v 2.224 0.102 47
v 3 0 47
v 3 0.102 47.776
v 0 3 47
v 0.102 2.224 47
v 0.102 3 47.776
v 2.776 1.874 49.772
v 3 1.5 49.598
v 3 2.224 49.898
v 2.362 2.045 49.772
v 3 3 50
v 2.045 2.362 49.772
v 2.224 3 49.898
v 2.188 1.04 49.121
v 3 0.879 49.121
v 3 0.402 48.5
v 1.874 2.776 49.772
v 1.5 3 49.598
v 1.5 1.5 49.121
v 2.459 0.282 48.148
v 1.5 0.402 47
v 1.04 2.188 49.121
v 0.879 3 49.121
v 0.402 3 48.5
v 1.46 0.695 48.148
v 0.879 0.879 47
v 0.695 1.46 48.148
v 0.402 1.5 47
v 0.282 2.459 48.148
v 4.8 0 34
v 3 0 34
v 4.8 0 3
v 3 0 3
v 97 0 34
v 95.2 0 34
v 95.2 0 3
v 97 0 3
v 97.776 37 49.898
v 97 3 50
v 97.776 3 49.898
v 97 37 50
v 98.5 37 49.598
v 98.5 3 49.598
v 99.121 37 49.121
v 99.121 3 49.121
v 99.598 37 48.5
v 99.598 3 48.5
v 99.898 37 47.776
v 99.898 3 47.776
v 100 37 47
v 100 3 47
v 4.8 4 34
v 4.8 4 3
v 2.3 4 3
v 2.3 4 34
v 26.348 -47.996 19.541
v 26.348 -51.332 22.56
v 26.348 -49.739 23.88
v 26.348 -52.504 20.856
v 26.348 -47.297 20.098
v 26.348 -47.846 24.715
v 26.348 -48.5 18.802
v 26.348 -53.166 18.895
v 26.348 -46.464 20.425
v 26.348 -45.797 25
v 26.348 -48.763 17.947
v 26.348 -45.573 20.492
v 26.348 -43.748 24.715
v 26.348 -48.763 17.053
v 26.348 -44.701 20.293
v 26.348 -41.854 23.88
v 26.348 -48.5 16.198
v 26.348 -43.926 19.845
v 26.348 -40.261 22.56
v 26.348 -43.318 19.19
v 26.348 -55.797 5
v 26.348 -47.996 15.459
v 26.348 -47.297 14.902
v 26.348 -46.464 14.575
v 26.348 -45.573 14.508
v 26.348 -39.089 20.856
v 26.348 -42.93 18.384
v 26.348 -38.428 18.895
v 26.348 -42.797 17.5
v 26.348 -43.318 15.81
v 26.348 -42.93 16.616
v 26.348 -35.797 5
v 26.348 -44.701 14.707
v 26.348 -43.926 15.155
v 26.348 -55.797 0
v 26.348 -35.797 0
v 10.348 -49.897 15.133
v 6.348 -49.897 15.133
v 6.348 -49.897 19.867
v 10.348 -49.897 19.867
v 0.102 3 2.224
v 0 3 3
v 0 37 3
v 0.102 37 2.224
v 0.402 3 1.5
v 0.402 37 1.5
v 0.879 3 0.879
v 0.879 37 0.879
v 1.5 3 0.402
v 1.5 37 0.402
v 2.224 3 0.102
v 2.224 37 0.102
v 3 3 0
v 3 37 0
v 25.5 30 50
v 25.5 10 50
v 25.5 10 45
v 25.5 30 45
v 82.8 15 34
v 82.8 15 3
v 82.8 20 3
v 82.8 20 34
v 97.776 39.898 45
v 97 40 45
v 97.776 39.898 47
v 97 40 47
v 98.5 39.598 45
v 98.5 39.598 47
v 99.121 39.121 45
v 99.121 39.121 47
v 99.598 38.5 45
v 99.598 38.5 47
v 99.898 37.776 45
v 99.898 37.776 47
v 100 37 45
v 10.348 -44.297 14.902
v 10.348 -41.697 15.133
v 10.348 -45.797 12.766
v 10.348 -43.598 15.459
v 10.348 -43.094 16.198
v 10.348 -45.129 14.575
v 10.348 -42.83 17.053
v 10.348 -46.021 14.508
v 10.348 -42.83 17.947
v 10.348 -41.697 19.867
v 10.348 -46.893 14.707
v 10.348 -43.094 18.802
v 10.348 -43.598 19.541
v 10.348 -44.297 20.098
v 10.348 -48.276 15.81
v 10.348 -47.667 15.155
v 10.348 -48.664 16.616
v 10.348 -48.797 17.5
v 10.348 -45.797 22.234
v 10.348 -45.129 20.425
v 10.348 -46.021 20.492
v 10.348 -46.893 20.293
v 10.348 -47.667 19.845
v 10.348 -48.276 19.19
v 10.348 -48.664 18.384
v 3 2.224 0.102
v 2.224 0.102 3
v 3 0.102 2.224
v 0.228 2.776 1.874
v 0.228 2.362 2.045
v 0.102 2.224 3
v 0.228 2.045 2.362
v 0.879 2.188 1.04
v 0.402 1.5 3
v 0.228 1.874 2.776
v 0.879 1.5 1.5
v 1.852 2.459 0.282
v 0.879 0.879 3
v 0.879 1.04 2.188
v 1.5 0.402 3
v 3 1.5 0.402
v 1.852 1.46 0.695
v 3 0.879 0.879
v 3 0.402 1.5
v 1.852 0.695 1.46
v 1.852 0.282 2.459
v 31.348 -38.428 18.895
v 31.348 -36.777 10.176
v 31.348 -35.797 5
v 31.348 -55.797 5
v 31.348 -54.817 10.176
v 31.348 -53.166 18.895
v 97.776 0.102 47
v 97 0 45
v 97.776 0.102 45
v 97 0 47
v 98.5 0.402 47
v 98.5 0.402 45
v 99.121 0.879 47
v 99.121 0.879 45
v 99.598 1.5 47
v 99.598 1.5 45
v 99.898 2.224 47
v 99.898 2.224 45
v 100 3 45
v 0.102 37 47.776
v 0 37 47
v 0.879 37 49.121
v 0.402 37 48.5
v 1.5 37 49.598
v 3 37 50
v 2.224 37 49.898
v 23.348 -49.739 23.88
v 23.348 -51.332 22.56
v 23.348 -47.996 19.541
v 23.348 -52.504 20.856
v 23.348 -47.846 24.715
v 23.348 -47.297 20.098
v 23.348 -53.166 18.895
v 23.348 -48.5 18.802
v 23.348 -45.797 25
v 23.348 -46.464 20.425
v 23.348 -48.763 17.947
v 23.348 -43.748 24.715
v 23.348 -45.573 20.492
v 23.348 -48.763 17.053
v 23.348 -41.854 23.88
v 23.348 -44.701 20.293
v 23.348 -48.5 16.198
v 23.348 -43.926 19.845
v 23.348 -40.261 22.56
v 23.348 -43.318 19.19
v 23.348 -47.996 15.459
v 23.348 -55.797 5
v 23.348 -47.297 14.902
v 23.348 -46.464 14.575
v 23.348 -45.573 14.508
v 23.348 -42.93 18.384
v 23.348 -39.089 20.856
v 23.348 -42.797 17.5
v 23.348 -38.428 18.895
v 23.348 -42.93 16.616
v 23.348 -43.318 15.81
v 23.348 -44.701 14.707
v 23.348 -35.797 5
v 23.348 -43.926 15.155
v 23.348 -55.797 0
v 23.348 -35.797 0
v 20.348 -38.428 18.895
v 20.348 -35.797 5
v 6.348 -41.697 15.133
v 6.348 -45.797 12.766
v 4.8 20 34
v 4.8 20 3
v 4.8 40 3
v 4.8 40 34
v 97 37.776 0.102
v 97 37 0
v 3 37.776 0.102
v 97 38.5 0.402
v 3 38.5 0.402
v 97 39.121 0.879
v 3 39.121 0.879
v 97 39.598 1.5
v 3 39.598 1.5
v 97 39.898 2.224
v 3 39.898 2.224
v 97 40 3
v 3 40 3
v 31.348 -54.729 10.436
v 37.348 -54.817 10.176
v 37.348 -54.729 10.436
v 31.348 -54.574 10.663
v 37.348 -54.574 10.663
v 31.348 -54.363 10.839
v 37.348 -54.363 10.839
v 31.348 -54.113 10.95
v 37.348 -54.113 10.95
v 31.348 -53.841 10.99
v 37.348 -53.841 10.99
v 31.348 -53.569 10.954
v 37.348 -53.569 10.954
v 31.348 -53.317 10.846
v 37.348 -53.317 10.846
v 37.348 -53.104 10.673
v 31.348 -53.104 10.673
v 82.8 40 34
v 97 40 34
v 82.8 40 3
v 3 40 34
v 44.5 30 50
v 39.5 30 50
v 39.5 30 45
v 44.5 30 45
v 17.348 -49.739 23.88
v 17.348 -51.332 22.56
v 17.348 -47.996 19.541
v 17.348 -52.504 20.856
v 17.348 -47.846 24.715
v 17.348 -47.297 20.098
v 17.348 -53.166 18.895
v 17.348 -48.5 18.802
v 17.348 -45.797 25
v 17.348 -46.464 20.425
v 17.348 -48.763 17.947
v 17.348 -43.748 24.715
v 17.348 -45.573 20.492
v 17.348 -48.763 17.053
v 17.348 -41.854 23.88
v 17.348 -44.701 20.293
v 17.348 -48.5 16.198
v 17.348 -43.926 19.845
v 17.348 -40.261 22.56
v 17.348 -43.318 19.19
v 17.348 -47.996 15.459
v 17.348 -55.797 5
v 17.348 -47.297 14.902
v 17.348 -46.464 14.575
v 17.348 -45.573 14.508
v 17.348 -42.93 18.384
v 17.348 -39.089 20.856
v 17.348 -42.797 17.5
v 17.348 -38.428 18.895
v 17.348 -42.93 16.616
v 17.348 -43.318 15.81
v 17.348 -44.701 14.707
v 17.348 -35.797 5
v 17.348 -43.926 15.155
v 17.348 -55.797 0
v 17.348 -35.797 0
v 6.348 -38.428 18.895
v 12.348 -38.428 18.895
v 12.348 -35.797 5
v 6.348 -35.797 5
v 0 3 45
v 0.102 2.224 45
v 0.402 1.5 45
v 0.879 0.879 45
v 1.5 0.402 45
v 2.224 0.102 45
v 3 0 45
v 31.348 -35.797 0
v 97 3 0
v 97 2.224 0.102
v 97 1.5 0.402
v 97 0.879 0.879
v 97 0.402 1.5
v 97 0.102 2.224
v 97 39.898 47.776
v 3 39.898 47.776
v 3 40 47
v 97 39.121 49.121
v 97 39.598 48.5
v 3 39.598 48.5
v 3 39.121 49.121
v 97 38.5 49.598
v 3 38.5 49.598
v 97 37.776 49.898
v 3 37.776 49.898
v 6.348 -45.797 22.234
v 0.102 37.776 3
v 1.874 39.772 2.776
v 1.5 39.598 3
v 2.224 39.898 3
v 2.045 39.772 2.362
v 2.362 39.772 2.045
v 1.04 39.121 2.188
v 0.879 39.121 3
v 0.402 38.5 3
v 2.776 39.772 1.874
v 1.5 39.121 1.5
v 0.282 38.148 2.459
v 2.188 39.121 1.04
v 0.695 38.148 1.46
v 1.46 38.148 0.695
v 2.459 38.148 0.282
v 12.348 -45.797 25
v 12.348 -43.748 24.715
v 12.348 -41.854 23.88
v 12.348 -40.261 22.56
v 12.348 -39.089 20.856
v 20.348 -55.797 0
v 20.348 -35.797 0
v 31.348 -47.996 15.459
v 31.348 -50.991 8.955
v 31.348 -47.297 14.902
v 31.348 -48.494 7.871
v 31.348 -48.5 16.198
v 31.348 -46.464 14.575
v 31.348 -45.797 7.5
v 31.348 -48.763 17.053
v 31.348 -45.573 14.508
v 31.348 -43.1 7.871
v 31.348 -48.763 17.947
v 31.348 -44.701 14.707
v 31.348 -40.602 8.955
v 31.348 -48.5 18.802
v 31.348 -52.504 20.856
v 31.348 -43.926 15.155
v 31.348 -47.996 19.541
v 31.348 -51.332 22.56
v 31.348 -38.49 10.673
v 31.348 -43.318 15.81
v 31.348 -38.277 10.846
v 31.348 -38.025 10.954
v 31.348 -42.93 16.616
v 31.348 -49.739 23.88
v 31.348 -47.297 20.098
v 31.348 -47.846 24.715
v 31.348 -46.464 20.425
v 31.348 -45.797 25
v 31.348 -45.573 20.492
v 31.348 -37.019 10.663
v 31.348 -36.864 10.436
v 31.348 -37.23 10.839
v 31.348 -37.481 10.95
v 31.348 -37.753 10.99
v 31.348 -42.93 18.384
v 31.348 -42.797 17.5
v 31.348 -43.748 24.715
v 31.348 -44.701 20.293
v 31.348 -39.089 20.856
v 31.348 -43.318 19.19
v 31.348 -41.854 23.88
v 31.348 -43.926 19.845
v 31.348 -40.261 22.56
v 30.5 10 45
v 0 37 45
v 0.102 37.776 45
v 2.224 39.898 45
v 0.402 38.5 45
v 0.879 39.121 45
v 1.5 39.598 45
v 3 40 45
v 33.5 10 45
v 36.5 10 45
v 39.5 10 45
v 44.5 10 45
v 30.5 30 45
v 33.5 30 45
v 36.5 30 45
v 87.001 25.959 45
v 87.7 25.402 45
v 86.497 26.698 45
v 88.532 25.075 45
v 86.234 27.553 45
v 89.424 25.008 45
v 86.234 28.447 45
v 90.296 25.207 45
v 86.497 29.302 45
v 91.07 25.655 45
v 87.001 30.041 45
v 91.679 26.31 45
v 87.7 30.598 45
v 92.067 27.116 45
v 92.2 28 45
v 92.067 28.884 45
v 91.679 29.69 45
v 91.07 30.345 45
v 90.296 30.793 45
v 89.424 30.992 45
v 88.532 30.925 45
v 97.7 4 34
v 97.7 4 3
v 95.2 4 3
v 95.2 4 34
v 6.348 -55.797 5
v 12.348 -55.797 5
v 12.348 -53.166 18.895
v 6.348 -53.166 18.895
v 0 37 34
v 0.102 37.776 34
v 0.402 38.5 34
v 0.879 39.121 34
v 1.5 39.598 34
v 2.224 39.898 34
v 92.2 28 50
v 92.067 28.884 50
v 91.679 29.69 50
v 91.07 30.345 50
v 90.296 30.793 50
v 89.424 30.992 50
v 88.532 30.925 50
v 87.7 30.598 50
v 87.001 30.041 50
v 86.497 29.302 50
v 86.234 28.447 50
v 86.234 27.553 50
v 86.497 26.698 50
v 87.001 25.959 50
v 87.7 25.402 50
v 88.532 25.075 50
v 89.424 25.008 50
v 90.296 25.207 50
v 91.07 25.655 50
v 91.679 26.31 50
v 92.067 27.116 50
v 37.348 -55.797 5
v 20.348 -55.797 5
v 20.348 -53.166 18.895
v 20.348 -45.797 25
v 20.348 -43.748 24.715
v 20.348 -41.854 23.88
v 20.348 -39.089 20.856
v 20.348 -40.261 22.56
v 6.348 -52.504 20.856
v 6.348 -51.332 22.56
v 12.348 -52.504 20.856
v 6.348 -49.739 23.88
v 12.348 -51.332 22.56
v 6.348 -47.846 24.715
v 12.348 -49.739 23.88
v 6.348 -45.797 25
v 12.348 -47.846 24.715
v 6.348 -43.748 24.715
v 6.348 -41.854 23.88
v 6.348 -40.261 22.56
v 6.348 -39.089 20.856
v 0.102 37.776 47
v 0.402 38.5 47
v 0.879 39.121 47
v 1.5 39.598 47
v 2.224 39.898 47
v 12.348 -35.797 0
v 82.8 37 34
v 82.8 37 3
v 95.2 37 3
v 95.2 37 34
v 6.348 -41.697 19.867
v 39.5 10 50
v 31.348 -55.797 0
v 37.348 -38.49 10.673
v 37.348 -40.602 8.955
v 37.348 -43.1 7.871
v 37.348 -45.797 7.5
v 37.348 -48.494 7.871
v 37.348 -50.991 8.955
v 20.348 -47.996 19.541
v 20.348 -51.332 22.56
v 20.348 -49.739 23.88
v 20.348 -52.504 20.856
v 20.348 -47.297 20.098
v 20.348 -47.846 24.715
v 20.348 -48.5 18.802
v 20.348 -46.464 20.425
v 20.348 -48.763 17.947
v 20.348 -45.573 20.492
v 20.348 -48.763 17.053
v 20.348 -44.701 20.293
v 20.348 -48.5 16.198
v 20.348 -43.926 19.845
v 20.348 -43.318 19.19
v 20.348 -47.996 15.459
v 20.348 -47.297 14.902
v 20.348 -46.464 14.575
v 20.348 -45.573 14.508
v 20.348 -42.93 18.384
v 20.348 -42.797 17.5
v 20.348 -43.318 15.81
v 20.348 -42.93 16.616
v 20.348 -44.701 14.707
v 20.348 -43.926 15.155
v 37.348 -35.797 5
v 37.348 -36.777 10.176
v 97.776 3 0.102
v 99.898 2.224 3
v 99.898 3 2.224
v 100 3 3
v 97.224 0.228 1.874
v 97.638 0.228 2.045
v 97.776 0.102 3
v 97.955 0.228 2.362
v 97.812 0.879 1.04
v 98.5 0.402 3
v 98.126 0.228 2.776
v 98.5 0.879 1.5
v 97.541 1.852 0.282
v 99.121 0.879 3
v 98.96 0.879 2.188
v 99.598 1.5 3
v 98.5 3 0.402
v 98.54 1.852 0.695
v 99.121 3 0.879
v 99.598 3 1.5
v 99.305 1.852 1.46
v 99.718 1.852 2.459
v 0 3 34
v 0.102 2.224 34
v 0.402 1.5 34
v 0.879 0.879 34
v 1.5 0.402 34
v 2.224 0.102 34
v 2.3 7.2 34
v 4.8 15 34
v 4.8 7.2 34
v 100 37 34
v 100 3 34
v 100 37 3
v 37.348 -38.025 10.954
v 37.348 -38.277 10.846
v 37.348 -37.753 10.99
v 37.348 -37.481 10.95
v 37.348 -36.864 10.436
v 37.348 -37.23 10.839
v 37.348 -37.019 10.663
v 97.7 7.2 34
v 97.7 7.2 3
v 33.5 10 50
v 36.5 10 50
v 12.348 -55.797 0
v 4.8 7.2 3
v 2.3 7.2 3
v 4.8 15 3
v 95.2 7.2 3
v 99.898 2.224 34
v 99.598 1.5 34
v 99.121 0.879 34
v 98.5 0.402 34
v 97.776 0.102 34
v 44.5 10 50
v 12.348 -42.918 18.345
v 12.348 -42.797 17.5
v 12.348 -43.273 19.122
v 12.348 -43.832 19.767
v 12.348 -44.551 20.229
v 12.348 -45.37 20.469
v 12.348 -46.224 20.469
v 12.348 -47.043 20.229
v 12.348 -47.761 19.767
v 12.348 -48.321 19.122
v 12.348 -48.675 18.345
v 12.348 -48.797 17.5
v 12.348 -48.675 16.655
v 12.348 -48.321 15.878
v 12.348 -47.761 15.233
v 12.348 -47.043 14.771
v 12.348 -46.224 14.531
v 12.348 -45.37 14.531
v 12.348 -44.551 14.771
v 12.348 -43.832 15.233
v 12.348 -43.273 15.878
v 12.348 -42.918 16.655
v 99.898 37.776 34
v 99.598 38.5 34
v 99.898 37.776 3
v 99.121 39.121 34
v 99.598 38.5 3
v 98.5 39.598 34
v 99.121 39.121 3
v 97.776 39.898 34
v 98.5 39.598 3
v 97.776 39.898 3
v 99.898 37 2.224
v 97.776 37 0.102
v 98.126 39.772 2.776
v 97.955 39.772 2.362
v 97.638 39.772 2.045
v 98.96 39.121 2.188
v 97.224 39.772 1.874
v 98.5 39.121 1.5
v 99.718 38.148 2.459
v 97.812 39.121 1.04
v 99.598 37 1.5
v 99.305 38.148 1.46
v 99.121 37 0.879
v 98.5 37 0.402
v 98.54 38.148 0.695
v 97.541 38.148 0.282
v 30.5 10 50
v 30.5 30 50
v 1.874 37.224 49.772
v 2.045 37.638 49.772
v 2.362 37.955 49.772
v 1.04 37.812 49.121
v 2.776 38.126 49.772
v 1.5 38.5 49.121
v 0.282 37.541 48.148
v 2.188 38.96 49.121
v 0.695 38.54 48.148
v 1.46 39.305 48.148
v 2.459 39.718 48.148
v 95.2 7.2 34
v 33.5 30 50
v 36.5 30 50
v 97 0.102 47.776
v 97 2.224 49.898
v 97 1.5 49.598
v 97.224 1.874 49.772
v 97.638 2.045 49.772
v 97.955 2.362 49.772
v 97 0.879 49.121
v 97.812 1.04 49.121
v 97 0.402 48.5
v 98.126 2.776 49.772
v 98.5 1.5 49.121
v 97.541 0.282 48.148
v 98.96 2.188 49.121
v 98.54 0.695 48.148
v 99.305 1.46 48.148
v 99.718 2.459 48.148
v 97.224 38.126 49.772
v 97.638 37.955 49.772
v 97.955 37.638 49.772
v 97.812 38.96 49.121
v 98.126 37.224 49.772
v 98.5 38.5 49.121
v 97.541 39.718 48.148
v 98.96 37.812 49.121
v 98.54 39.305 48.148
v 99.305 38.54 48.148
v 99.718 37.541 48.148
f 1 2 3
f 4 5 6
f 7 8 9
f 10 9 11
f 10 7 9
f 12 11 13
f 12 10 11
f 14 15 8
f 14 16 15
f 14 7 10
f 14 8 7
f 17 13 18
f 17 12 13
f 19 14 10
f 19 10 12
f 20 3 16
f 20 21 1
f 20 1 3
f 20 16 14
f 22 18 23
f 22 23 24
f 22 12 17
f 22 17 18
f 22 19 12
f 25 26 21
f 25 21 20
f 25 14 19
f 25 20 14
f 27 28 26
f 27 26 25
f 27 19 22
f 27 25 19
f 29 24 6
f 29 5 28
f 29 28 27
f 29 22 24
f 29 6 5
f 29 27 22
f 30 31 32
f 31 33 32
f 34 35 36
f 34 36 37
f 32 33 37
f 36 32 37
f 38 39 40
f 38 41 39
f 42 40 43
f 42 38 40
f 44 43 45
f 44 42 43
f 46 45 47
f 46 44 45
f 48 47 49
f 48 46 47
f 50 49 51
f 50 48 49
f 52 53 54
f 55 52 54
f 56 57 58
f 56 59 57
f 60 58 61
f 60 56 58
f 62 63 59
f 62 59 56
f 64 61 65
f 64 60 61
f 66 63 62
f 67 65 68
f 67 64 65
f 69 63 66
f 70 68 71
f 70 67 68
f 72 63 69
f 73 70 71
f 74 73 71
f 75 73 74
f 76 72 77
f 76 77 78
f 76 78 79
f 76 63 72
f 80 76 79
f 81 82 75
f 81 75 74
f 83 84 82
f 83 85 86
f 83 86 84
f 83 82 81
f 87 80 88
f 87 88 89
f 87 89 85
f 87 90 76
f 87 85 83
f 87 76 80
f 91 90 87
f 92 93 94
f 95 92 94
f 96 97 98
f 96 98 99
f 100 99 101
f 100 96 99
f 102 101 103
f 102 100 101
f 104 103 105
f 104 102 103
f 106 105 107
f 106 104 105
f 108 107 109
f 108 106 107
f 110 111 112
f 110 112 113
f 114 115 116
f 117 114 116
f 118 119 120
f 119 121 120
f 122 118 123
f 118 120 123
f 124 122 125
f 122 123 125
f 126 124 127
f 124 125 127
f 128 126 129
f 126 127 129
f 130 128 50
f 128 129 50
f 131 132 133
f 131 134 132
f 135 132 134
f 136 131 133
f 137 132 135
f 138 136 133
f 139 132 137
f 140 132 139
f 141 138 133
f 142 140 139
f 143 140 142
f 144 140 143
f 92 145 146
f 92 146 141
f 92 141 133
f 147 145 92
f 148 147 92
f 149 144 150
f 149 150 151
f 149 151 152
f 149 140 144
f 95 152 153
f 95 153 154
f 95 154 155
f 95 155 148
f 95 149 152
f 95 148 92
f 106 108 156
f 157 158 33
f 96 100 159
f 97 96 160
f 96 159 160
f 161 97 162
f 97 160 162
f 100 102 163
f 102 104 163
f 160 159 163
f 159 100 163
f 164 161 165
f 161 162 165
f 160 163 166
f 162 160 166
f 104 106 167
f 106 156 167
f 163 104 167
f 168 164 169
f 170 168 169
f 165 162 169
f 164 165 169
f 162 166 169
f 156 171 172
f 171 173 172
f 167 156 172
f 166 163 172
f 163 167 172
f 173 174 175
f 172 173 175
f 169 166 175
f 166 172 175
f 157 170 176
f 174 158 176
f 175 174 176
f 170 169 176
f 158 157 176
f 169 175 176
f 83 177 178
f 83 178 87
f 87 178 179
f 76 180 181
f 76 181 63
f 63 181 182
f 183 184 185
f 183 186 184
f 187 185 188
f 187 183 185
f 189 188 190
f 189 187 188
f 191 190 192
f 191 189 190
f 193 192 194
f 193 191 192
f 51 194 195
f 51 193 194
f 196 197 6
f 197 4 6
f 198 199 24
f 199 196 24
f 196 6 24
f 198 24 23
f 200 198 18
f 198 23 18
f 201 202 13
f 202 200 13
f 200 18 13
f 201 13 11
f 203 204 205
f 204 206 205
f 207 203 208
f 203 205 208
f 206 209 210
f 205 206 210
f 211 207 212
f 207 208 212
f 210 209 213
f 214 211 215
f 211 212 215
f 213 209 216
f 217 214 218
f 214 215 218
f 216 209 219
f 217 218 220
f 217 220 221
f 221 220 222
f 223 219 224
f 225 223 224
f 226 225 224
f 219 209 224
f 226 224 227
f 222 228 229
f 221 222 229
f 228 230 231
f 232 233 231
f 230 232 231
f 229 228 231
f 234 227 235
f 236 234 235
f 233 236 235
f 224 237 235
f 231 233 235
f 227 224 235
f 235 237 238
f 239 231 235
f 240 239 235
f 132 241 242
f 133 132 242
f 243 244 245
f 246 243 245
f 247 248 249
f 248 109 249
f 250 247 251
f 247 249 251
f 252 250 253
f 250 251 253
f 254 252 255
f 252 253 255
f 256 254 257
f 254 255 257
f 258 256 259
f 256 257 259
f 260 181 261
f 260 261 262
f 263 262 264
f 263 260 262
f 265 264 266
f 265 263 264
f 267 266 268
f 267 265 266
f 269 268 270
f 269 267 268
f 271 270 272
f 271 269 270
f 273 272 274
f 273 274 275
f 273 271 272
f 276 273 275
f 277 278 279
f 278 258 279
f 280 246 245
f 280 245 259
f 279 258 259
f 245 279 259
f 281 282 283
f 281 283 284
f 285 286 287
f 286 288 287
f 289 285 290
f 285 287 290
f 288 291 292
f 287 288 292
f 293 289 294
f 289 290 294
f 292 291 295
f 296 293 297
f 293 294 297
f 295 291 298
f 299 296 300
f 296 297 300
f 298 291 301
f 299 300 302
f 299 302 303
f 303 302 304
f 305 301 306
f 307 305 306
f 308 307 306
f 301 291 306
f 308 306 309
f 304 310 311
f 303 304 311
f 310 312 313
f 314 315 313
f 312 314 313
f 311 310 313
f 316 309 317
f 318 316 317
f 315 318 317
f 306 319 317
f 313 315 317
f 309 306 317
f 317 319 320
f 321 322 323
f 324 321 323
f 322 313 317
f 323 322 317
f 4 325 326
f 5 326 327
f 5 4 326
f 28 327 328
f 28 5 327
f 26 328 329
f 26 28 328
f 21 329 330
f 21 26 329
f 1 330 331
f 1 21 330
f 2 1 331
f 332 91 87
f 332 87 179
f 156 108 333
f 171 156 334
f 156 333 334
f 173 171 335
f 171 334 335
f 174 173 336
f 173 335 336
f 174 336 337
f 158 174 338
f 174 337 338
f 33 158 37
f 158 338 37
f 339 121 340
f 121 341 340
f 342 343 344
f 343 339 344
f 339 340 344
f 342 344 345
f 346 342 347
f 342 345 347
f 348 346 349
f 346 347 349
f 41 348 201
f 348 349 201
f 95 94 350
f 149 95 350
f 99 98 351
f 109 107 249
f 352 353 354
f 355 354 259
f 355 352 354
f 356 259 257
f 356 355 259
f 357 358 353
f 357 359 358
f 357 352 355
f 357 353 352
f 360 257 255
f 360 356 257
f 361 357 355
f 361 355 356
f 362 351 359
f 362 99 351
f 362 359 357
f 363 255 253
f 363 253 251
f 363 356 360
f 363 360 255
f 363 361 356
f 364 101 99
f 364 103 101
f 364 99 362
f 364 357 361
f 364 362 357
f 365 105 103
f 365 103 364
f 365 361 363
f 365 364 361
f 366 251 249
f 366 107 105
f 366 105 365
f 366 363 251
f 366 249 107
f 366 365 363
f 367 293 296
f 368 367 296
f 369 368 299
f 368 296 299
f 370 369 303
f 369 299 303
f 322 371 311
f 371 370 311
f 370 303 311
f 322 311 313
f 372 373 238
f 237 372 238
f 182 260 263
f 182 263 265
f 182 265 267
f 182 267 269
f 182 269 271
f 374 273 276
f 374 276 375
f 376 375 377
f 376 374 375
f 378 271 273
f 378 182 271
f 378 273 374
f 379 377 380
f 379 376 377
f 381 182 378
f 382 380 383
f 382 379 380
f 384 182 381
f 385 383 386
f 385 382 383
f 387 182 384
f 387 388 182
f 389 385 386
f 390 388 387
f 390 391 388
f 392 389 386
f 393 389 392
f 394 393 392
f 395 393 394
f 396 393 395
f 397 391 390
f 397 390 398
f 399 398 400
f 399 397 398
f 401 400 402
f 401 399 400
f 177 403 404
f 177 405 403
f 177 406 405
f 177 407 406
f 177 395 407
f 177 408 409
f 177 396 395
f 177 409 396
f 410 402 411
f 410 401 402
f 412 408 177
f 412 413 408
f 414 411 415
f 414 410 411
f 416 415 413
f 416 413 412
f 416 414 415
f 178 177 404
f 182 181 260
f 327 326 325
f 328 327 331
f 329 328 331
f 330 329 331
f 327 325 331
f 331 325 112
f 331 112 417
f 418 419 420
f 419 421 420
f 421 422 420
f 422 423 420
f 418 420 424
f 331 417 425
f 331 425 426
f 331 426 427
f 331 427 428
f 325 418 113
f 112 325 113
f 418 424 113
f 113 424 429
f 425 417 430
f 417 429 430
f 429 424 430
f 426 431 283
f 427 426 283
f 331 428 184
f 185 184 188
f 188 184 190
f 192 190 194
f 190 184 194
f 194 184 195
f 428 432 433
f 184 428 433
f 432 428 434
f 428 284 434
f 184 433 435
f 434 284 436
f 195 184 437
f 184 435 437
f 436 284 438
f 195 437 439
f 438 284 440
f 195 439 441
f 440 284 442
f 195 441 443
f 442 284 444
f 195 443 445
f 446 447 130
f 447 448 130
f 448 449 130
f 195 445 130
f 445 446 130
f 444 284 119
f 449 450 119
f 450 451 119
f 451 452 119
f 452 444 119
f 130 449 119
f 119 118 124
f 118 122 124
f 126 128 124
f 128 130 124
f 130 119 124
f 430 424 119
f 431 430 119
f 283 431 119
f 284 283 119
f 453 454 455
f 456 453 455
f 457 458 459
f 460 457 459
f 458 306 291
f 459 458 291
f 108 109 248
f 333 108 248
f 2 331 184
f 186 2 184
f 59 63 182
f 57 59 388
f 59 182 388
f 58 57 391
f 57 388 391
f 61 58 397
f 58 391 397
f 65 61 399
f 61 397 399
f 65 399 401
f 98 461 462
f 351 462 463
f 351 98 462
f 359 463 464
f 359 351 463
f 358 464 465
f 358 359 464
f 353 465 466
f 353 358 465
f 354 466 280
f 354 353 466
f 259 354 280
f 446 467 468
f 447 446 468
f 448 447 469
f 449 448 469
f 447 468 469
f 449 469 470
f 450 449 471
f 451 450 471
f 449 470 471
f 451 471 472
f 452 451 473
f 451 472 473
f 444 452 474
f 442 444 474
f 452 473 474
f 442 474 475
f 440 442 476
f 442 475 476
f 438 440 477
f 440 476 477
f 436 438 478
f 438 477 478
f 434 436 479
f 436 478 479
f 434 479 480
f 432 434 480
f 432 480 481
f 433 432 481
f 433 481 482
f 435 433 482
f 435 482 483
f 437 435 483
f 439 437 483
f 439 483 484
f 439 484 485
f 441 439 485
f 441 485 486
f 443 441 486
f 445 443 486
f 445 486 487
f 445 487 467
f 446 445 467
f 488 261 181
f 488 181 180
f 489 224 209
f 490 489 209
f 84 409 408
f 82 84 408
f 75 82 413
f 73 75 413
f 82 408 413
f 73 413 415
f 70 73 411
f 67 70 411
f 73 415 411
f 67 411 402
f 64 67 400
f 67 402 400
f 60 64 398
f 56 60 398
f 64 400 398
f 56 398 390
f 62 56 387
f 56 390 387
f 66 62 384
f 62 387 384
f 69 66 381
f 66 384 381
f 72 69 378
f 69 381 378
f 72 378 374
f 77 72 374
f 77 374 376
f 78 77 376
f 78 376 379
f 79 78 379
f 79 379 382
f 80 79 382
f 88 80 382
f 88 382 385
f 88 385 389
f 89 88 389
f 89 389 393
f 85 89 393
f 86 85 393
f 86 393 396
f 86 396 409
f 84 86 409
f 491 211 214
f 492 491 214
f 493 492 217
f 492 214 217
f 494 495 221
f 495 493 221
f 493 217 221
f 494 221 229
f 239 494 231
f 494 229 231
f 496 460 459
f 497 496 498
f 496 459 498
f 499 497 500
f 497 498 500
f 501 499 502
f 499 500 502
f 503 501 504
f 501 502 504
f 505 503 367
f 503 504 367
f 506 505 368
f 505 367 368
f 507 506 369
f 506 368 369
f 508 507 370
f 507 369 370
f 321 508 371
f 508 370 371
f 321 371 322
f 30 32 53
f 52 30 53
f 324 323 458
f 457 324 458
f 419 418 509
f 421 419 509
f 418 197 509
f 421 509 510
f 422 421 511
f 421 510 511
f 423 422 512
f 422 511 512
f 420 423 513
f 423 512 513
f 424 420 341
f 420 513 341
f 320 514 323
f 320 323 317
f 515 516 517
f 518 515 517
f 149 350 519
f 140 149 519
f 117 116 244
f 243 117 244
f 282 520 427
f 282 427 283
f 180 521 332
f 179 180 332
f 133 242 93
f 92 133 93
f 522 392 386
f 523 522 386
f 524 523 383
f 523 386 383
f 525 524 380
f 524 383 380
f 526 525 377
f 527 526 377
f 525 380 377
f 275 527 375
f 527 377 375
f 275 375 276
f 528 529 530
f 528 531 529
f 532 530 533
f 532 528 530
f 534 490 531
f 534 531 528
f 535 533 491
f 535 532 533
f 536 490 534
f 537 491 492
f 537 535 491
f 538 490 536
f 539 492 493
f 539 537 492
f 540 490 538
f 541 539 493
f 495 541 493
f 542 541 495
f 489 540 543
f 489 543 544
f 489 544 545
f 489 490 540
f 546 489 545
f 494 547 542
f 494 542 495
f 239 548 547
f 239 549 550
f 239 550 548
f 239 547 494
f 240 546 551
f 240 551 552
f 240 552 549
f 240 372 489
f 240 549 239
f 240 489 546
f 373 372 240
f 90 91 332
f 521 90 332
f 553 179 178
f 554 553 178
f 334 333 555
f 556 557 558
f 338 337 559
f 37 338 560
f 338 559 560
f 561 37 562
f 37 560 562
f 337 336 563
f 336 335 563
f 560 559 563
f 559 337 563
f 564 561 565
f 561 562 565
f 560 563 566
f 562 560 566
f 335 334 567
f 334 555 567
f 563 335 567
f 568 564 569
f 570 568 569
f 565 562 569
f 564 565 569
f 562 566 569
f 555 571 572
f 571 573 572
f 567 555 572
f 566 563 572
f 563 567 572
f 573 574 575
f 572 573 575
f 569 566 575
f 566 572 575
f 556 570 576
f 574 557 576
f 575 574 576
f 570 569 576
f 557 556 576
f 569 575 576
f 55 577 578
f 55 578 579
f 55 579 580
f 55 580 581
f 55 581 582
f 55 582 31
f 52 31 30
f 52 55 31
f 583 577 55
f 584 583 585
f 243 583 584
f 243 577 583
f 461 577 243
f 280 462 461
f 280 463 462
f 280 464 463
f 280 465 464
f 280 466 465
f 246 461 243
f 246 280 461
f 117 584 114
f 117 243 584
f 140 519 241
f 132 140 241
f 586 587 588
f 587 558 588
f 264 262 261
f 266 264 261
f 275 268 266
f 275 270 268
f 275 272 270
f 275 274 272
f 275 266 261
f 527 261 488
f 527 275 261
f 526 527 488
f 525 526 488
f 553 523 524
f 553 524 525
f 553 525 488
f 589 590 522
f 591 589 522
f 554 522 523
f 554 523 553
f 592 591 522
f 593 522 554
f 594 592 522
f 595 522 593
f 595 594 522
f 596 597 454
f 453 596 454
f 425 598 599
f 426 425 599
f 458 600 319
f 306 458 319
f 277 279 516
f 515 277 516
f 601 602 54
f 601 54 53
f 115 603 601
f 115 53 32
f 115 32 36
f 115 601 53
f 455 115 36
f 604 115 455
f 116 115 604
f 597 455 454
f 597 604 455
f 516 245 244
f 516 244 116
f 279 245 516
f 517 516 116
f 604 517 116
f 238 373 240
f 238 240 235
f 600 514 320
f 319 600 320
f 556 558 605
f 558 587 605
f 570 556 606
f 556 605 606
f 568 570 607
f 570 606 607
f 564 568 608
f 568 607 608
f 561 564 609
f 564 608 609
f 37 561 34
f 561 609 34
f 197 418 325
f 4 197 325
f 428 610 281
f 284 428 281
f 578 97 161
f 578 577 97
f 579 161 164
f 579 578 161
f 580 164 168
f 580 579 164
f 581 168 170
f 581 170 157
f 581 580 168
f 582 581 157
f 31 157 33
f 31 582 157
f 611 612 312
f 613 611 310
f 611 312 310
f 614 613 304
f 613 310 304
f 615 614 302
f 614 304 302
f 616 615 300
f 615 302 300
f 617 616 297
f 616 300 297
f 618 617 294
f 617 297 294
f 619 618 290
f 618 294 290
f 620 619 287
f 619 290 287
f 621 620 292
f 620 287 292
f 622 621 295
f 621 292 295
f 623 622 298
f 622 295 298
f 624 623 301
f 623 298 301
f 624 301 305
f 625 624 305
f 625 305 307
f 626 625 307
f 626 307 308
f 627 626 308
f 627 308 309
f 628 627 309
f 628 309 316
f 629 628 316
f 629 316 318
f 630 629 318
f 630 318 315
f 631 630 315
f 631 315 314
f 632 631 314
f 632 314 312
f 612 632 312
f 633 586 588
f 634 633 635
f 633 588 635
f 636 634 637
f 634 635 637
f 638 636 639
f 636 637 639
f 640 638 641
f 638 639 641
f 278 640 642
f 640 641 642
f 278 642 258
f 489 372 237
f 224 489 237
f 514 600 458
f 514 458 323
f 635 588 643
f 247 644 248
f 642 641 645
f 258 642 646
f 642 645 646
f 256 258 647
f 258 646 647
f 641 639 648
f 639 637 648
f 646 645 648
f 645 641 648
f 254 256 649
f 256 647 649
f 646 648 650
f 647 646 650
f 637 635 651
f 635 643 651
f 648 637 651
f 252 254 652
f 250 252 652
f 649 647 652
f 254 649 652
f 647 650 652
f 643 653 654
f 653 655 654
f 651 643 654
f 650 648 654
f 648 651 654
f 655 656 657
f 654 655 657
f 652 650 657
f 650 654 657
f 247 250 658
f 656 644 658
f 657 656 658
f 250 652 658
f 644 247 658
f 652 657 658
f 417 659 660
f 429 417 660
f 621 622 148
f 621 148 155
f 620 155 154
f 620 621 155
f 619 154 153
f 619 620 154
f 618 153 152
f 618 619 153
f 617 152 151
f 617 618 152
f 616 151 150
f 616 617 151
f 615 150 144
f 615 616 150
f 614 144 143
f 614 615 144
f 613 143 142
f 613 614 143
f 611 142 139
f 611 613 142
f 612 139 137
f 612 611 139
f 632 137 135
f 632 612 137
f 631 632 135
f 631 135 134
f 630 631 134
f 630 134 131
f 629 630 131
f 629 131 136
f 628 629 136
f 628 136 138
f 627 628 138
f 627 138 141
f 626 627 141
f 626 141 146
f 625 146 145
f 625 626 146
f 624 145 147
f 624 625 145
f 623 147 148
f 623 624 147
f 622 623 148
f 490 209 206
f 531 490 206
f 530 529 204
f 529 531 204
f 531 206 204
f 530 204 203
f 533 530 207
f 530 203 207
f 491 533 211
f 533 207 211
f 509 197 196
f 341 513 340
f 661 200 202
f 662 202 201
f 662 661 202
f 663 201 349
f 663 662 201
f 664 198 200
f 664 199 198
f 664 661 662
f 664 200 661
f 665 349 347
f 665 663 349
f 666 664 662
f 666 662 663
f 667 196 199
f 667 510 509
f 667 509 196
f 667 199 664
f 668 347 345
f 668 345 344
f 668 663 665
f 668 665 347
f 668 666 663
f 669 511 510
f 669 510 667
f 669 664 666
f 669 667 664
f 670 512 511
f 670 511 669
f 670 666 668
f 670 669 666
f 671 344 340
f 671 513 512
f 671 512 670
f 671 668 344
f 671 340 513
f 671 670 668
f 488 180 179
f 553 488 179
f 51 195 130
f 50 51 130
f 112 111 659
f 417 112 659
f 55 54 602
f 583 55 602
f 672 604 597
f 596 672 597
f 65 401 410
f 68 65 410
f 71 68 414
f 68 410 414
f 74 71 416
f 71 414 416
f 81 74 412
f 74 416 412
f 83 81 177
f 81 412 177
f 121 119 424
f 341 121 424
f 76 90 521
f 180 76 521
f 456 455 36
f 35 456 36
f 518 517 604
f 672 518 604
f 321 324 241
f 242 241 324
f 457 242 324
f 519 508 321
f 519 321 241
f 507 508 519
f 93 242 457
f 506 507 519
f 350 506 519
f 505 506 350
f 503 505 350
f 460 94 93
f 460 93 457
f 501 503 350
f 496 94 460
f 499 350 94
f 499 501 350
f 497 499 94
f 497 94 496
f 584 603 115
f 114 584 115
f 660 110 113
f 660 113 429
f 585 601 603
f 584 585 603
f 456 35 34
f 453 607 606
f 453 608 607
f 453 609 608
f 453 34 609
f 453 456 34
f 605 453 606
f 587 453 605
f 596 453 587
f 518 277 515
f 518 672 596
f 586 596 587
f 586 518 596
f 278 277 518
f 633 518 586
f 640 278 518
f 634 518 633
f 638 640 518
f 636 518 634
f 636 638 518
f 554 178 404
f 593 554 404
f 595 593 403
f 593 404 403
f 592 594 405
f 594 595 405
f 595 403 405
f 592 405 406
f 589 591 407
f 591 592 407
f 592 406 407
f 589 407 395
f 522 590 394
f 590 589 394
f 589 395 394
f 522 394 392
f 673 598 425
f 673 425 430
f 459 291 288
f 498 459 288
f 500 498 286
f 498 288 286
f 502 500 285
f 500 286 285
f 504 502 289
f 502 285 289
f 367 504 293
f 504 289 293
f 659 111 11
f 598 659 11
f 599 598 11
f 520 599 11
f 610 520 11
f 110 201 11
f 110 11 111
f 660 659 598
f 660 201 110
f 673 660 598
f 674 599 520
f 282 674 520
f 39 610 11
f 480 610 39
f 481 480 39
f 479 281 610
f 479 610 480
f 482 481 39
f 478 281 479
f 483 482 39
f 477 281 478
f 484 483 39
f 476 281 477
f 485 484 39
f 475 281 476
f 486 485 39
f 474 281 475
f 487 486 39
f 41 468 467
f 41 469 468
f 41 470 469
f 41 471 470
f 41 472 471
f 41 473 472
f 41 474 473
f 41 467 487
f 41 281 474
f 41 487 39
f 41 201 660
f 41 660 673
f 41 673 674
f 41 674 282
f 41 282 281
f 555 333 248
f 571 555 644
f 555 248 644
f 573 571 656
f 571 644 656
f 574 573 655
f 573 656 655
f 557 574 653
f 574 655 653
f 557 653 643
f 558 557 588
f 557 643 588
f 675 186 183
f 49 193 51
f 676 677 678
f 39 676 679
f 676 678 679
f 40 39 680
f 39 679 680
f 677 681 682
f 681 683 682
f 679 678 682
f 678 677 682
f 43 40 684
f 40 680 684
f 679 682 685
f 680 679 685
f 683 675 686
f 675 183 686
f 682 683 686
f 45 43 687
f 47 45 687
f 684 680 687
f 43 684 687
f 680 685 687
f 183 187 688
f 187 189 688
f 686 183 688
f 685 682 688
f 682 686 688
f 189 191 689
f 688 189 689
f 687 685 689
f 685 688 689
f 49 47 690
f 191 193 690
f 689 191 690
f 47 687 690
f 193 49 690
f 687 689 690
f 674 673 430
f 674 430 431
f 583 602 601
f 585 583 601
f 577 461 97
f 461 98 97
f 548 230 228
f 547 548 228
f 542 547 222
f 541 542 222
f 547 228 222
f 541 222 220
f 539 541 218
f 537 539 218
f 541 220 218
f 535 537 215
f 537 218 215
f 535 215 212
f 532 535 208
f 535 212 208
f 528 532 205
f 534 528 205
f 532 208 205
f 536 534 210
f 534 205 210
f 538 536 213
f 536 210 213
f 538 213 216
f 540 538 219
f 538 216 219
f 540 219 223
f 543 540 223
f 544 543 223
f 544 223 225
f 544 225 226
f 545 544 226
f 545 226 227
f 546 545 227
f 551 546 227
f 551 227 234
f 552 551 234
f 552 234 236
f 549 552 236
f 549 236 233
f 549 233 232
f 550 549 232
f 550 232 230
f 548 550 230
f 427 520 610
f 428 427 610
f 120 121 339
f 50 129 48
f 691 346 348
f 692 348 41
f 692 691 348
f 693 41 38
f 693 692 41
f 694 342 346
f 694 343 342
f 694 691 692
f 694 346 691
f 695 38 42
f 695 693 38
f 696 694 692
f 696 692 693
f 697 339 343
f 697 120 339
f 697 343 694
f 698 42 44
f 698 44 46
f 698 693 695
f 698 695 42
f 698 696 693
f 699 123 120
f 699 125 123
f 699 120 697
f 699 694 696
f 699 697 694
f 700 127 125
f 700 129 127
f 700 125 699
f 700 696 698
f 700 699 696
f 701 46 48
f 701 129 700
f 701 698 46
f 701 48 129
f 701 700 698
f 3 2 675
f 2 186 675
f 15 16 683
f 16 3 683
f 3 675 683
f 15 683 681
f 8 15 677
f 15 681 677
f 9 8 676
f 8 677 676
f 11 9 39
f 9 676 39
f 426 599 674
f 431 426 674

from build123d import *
from build123d import SkipClean  # not in build123d's __all__

# Parameters (mm, degrees)
F1_DEPTH     = 3
F2_DEPTH     = 34
F3_R         = 2.99999
F4_START     = 45
F4_DEPTH     = 5
F5_W         = 3
F5_H         = 20
F5_W_2       = 5
F5_R         = 3
F6_DEPTH     = 25
F7_R         = 3
F8_W         = 5
F8_H         = 20
F9_DEPTH     = 25
F8_W_2       = 3
F10_R        = 3
F11_DEPTH    = 25
F13_DEPTH    = 6
F14_T1_DEPTH = 11.6493534925
F15_R        = 3
F16_DEPTH    = 6
F18_DEPTH    = 4


# Not quite as in the source:
# - a fillet or chamfer that OpenCascade refuses, or shapes differently, is made with other operations: its cross-section is extruded or revolved along the edge and cut away or added
# - a fillet or chamfer is up to 0.001 mm smaller than in the source, because OpenCascade refuses the exact size
# - after a boolean that leaves OpenCascade's solid faulty, fix() repairs it


with BuildPart() as f1:
    # F0 (on Top) → F1 (new body)
    with BuildSketch(Plane.XY):
        Polygon((0, 40), (0, 0), (4.8, 0), (4.8, 4), (2.3, 4), (2.3, 7.2), (4.8, 7.2), (4.8, 15), (82.8, 15), (82.8, 20), (4.8, 20), (4.8, 37), (4.8, 40), align=None)
        Polygon((95.2, 4), (95.2, 0), (100, 0), (100, 40), (82.8, 40), (82.8, 37), (95.2, 37), (95.2, 7.2), (97.7, 7.2), (97.7, 4), align=None)
        Polygon((4.8, 4), (4.8, 0), (95.2, 0), (95.2, 4), (97.7, 4), (97.7, 7.2), (95.2, 7.2), (95.2, 37), (82.8, 37), (82.8, 40), (4.8, 40), (4.8, 37), (4.8, 20), (82.8, 20), (82.8, 15), (4.8, 15), (4.8, 7.2), (2.3, 7.2), (2.3, 4), align=None)
    extrude(amount=F1_DEPTH)

    # F0 (on Top) → F2 (join)
    with BuildSketch(Plane.XY):
        Polygon((0, 40), (0, 0), (4.8, 0), (4.8, 4), (2.3, 4), (2.3, 7.2), (4.8, 7.2), (4.8, 15), (82.8, 15), (82.8, 20), (4.8, 20), (4.8, 37), (4.8, 40), align=None)
        Polygon((95.2, 4), (95.2, 0), (100, 0), (100, 40), (82.8, 40), (82.8, 37), (95.2, 37), (95.2, 7.2), (97.7, 7.2), (97.7, 4), align=None)
    extrude(amount=F2_DEPTH)

    # F3 (radius 3 in the source; OpenCascade refuses exactly that, so slightly less here)
    f3_edges = [f1.edges().sort_by_distance(p)[0] for p in [
        (100, 20, 0),
        (50, 0, 0),
        (100, 0, 17),
        (0, 20, 0),
        (0, 0, 17),
        (0, 40, 17),
        (100, 40, 17),
        (50, 40, 0),
    ]]
    fillet(f3_edges, radius=F3_R)


with BuildPart() as f4:
    # F0 (on Top) → F4 (new body)
    with BuildSketch(Plane.XY.offset(F4_START)):
        Polygon((4.8, 4), (4.8, 0), (95.2, 0), (95.2, 4), (97.7, 4), (97.7, 7.2), (95.2, 7.2), (95.2, 37), (82.8, 37), (82.8, 40), (4.8, 40), (4.8, 37), (4.8, 20), (82.8, 20), (82.8, 15), (4.8, 15), (4.8, 7.2), (2.3, 7.2), (2.3, 4), align=None)
        Polygon((0, 40), (0, 0), (4.8, 0), (4.8, 4), (2.3, 4), (2.3, 7.2), (4.8, 7.2), (4.8, 15), (82.8, 15), (82.8, 20), (4.8, 20), (4.8, 37), (4.8, 40), align=None)
        Polygon((95.2, 4), (95.2, 0), (100, 0), (100, 40), (82.8, 40), (82.8, 37), (95.2, 37), (95.2, 7.2), (97.7, 7.2), (97.7, 4), align=None)
    extrude(amount=F4_DEPTH)

    # F5 (on face) → F6 (cut)
    with BuildSketch(Plane.XY.offset(50)):
        with Locations((35, 20)):
            Rectangle(F5_W, F5_H)
        with Locations((28, 20)):
            Rectangle(F5_W_2, F5_H)
        with Locations((42, 20)):
            Rectangle(F5_W_2, F5_H)
        with Locations((89.2, 28)):
            Circle(F5_R)
    extrude(amount=-F6_DEPTH, mode=Mode.SUBTRACT)

    # F7
    f7_edges = [f4.edges().sort_by_distance(p)[0] for p in [
        (0, 0, 47.5),
        (0, 40, 47.5),
        (100, 0, 47.5),
        (100, 40, 47.5),
        (50, 0, 50),
        (0, 20, 50),
        (50, 40, 50),
        (100, 20, 50),
    ]]
    fillet(f7_edges, radius=F7_R)


with BuildPart() as f9:
    # F8 (on Top) → F9 (new body)
    with BuildSketch(Plane.XY):
        with Locations((14.8477478921, -45.7968057692)):
            Rectangle(F8_W, F8_H)
    extrude(amount=F9_DEPTH)


with BuildPart() as f9b:
    # F8 (on Top) → F9, piece 2 (new body)
    with BuildSketch(Plane.XY):
        with Locations((28.8477478921, -45.7968057692)):
            Rectangle(F8_W, F8_H)
    extrude(amount=F9_DEPTH)


with BuildPart() as f9c:
    # F8 (on Top) → F9, piece 3 (new body)
    with BuildSketch(Plane.XY):
        with Locations((21.8477478921, -45.7968057692)):
            Rectangle(F8_W_2, F8_H)
    extrude(amount=F9_DEPTH)


with BuildPart() as f11_tool:
    # F10 (on face) → F11 (new body)
    with BuildSketch(Plane.YZ.offset(31.3477478921)):
        with BuildLine():
            Line((-55.7968057692, 5), (-53.1658797779, 18.8952592069))
            ThreePointArc((-53.1658797779, 18.8952592069), (-50.5814455648, 23.2755711428), (-45.7968057692, 25))
            Line((-45.7968057692, 25), (-55.7968057692, 25))
            Line((-55.7968057692, 25), (-55.7968057692, 5))
        make_face()
        with BuildLine():
            ThreePointArc((-45.7968057692, 25), (-41.0121659736, 23.2755711428), (-38.4277317605, 18.8952592069))
            Line((-38.4277317605, 18.8952592069), (-35.7968057692, 5))
            Line((-35.7968057692, 5), (-35.7968057692, 25))
            Line((-35.7968057692, 25), (-45.7968057692, 25))
        make_face()
        with Locations((-45.7968057692, 17.5)):
            Circle(F10_R)
    extrude(amount=-F11_DEPTH)


with BuildPart() as f9_1:
    add(f9.part, clean=False)

    # F11: cut by f11_tool
    add(f11_tool.part, mode=Mode.SUBTRACT)

    # F15 (on face) → F16 (join)
    with BuildSketch(Plane(origin=(12.3477478921, 0, 0), x_dir=(0, -1, 0), z_dir=(-1, 0, 0))):
        with BuildLine():
            Line((38.4277317605, 18.8952592069), (35.7968057692, 5))
            Line((35.7968057692, 5), (55.7968057692, 5))
            Line((55.7968057692, 5), (53.1658797779, 18.8952592069))
            ThreePointArc((53.1658797779, 18.8952592069), (45.7968057692, 25), (38.4277317605, 18.8952592069))
        make_face()
        with Locations((45.7968057692, 17.5)):
            Circle(F15_R, mode=Mode.SUBTRACT)
    with SkipClean():  # cleaning this boolean's faces spoils the solid; the shape is the same uncleaned
        extrude(amount=F16_DEPTH)

    # F17 (on face) → F18 (cut)
    with BuildSketch(Plane(origin=(6.3477478921, 0, 0), x_dir=(0, -1, 0), z_dir=(-1, 0, 0))):
        Polygon((49.8968057692, 19.8671361037), (45.7968057692, 22.2342722074), (41.6968057692, 19.8671361037), (41.6968057692, 15.1328638963), (45.7968057692, 12.7657277926), (49.8968057692, 15.1328638963), align=None)
    extrude(amount=-F18_DEPTH, mode=Mode.SUBTRACT)

    add(f9_1.part.fix(), mode=Mode.REPLACE)


with BuildPart() as f9b_1:
    add(f9b.part, clean=False)

    # F11: cut by f11_tool
    add(f11_tool.part, mode=Mode.SUBTRACT)

    # F12 (on face) → F13 (join)
    with BuildSketch(Plane.YZ.offset(31.3477478921)):
        with BuildLine():
            Line((-54.3963827366, 12.3963468003), (-55.7968057692, 5))
            Line((-55.7968057692, 5), (-35.7968057692, 5))
            Line((-35.7968057692, 5), (-37.1972288018, 12.3963468003))
            ThreePointArc((-37.1972288018, 12.3963468003), (-45.7968057692, 7.5), (-54.3963827366, 12.3963468003))
        make_face()
    extrude(amount=F13_DEPTH)

    # F14: fillet of radius 1 on 2 edges, made by hand

    # F14_s2 → F14_t1 (cut)
    with BuildSketch(Plane.YZ.offset(31.3477478921)):
        with BuildLine():
            ThreePointArc((-54.8167727352, 10.1760532544), (-54.1126804314, 10.9504691595), (-53.1035546463, 10.6727442668))
            ThreePointArc((-53.1035546463, 10.6727442668), (-53.7965246325, 11.4996251693), (-54.3963827366, 12.3963468003))
            Line((-54.3963827366, 12.3963468003), (-54.8167727352, 10.1760532544))
        make_face()
        with BuildLine():
            ThreePointArc((-36.7768388032, 10.1760532544), (-37.480931107, 10.9504691595), (-38.4900568921, 10.6727442668))
            ThreePointArc((-38.4900568921, 10.6727442668), (-37.797086906, 11.4996251693), (-37.1972288018, 12.3963468003))
            Line((-37.1972288018, 12.3963468003), (-36.7768388032, 10.1760532544))
        make_face()
    extrude(amount=F14_T1_DEPTH, mode=Mode.SUBTRACT)


with BuildPart() as f9c_1:
    add(f9c.part, clean=False)

    # F11: cut by f11_tool
    add(f11_tool.part, mode=Mode.SUBTRACT)


solid = Compound([f1.part, f4.part, f9_1.part, f9b_1.part, f9c_1.part])
